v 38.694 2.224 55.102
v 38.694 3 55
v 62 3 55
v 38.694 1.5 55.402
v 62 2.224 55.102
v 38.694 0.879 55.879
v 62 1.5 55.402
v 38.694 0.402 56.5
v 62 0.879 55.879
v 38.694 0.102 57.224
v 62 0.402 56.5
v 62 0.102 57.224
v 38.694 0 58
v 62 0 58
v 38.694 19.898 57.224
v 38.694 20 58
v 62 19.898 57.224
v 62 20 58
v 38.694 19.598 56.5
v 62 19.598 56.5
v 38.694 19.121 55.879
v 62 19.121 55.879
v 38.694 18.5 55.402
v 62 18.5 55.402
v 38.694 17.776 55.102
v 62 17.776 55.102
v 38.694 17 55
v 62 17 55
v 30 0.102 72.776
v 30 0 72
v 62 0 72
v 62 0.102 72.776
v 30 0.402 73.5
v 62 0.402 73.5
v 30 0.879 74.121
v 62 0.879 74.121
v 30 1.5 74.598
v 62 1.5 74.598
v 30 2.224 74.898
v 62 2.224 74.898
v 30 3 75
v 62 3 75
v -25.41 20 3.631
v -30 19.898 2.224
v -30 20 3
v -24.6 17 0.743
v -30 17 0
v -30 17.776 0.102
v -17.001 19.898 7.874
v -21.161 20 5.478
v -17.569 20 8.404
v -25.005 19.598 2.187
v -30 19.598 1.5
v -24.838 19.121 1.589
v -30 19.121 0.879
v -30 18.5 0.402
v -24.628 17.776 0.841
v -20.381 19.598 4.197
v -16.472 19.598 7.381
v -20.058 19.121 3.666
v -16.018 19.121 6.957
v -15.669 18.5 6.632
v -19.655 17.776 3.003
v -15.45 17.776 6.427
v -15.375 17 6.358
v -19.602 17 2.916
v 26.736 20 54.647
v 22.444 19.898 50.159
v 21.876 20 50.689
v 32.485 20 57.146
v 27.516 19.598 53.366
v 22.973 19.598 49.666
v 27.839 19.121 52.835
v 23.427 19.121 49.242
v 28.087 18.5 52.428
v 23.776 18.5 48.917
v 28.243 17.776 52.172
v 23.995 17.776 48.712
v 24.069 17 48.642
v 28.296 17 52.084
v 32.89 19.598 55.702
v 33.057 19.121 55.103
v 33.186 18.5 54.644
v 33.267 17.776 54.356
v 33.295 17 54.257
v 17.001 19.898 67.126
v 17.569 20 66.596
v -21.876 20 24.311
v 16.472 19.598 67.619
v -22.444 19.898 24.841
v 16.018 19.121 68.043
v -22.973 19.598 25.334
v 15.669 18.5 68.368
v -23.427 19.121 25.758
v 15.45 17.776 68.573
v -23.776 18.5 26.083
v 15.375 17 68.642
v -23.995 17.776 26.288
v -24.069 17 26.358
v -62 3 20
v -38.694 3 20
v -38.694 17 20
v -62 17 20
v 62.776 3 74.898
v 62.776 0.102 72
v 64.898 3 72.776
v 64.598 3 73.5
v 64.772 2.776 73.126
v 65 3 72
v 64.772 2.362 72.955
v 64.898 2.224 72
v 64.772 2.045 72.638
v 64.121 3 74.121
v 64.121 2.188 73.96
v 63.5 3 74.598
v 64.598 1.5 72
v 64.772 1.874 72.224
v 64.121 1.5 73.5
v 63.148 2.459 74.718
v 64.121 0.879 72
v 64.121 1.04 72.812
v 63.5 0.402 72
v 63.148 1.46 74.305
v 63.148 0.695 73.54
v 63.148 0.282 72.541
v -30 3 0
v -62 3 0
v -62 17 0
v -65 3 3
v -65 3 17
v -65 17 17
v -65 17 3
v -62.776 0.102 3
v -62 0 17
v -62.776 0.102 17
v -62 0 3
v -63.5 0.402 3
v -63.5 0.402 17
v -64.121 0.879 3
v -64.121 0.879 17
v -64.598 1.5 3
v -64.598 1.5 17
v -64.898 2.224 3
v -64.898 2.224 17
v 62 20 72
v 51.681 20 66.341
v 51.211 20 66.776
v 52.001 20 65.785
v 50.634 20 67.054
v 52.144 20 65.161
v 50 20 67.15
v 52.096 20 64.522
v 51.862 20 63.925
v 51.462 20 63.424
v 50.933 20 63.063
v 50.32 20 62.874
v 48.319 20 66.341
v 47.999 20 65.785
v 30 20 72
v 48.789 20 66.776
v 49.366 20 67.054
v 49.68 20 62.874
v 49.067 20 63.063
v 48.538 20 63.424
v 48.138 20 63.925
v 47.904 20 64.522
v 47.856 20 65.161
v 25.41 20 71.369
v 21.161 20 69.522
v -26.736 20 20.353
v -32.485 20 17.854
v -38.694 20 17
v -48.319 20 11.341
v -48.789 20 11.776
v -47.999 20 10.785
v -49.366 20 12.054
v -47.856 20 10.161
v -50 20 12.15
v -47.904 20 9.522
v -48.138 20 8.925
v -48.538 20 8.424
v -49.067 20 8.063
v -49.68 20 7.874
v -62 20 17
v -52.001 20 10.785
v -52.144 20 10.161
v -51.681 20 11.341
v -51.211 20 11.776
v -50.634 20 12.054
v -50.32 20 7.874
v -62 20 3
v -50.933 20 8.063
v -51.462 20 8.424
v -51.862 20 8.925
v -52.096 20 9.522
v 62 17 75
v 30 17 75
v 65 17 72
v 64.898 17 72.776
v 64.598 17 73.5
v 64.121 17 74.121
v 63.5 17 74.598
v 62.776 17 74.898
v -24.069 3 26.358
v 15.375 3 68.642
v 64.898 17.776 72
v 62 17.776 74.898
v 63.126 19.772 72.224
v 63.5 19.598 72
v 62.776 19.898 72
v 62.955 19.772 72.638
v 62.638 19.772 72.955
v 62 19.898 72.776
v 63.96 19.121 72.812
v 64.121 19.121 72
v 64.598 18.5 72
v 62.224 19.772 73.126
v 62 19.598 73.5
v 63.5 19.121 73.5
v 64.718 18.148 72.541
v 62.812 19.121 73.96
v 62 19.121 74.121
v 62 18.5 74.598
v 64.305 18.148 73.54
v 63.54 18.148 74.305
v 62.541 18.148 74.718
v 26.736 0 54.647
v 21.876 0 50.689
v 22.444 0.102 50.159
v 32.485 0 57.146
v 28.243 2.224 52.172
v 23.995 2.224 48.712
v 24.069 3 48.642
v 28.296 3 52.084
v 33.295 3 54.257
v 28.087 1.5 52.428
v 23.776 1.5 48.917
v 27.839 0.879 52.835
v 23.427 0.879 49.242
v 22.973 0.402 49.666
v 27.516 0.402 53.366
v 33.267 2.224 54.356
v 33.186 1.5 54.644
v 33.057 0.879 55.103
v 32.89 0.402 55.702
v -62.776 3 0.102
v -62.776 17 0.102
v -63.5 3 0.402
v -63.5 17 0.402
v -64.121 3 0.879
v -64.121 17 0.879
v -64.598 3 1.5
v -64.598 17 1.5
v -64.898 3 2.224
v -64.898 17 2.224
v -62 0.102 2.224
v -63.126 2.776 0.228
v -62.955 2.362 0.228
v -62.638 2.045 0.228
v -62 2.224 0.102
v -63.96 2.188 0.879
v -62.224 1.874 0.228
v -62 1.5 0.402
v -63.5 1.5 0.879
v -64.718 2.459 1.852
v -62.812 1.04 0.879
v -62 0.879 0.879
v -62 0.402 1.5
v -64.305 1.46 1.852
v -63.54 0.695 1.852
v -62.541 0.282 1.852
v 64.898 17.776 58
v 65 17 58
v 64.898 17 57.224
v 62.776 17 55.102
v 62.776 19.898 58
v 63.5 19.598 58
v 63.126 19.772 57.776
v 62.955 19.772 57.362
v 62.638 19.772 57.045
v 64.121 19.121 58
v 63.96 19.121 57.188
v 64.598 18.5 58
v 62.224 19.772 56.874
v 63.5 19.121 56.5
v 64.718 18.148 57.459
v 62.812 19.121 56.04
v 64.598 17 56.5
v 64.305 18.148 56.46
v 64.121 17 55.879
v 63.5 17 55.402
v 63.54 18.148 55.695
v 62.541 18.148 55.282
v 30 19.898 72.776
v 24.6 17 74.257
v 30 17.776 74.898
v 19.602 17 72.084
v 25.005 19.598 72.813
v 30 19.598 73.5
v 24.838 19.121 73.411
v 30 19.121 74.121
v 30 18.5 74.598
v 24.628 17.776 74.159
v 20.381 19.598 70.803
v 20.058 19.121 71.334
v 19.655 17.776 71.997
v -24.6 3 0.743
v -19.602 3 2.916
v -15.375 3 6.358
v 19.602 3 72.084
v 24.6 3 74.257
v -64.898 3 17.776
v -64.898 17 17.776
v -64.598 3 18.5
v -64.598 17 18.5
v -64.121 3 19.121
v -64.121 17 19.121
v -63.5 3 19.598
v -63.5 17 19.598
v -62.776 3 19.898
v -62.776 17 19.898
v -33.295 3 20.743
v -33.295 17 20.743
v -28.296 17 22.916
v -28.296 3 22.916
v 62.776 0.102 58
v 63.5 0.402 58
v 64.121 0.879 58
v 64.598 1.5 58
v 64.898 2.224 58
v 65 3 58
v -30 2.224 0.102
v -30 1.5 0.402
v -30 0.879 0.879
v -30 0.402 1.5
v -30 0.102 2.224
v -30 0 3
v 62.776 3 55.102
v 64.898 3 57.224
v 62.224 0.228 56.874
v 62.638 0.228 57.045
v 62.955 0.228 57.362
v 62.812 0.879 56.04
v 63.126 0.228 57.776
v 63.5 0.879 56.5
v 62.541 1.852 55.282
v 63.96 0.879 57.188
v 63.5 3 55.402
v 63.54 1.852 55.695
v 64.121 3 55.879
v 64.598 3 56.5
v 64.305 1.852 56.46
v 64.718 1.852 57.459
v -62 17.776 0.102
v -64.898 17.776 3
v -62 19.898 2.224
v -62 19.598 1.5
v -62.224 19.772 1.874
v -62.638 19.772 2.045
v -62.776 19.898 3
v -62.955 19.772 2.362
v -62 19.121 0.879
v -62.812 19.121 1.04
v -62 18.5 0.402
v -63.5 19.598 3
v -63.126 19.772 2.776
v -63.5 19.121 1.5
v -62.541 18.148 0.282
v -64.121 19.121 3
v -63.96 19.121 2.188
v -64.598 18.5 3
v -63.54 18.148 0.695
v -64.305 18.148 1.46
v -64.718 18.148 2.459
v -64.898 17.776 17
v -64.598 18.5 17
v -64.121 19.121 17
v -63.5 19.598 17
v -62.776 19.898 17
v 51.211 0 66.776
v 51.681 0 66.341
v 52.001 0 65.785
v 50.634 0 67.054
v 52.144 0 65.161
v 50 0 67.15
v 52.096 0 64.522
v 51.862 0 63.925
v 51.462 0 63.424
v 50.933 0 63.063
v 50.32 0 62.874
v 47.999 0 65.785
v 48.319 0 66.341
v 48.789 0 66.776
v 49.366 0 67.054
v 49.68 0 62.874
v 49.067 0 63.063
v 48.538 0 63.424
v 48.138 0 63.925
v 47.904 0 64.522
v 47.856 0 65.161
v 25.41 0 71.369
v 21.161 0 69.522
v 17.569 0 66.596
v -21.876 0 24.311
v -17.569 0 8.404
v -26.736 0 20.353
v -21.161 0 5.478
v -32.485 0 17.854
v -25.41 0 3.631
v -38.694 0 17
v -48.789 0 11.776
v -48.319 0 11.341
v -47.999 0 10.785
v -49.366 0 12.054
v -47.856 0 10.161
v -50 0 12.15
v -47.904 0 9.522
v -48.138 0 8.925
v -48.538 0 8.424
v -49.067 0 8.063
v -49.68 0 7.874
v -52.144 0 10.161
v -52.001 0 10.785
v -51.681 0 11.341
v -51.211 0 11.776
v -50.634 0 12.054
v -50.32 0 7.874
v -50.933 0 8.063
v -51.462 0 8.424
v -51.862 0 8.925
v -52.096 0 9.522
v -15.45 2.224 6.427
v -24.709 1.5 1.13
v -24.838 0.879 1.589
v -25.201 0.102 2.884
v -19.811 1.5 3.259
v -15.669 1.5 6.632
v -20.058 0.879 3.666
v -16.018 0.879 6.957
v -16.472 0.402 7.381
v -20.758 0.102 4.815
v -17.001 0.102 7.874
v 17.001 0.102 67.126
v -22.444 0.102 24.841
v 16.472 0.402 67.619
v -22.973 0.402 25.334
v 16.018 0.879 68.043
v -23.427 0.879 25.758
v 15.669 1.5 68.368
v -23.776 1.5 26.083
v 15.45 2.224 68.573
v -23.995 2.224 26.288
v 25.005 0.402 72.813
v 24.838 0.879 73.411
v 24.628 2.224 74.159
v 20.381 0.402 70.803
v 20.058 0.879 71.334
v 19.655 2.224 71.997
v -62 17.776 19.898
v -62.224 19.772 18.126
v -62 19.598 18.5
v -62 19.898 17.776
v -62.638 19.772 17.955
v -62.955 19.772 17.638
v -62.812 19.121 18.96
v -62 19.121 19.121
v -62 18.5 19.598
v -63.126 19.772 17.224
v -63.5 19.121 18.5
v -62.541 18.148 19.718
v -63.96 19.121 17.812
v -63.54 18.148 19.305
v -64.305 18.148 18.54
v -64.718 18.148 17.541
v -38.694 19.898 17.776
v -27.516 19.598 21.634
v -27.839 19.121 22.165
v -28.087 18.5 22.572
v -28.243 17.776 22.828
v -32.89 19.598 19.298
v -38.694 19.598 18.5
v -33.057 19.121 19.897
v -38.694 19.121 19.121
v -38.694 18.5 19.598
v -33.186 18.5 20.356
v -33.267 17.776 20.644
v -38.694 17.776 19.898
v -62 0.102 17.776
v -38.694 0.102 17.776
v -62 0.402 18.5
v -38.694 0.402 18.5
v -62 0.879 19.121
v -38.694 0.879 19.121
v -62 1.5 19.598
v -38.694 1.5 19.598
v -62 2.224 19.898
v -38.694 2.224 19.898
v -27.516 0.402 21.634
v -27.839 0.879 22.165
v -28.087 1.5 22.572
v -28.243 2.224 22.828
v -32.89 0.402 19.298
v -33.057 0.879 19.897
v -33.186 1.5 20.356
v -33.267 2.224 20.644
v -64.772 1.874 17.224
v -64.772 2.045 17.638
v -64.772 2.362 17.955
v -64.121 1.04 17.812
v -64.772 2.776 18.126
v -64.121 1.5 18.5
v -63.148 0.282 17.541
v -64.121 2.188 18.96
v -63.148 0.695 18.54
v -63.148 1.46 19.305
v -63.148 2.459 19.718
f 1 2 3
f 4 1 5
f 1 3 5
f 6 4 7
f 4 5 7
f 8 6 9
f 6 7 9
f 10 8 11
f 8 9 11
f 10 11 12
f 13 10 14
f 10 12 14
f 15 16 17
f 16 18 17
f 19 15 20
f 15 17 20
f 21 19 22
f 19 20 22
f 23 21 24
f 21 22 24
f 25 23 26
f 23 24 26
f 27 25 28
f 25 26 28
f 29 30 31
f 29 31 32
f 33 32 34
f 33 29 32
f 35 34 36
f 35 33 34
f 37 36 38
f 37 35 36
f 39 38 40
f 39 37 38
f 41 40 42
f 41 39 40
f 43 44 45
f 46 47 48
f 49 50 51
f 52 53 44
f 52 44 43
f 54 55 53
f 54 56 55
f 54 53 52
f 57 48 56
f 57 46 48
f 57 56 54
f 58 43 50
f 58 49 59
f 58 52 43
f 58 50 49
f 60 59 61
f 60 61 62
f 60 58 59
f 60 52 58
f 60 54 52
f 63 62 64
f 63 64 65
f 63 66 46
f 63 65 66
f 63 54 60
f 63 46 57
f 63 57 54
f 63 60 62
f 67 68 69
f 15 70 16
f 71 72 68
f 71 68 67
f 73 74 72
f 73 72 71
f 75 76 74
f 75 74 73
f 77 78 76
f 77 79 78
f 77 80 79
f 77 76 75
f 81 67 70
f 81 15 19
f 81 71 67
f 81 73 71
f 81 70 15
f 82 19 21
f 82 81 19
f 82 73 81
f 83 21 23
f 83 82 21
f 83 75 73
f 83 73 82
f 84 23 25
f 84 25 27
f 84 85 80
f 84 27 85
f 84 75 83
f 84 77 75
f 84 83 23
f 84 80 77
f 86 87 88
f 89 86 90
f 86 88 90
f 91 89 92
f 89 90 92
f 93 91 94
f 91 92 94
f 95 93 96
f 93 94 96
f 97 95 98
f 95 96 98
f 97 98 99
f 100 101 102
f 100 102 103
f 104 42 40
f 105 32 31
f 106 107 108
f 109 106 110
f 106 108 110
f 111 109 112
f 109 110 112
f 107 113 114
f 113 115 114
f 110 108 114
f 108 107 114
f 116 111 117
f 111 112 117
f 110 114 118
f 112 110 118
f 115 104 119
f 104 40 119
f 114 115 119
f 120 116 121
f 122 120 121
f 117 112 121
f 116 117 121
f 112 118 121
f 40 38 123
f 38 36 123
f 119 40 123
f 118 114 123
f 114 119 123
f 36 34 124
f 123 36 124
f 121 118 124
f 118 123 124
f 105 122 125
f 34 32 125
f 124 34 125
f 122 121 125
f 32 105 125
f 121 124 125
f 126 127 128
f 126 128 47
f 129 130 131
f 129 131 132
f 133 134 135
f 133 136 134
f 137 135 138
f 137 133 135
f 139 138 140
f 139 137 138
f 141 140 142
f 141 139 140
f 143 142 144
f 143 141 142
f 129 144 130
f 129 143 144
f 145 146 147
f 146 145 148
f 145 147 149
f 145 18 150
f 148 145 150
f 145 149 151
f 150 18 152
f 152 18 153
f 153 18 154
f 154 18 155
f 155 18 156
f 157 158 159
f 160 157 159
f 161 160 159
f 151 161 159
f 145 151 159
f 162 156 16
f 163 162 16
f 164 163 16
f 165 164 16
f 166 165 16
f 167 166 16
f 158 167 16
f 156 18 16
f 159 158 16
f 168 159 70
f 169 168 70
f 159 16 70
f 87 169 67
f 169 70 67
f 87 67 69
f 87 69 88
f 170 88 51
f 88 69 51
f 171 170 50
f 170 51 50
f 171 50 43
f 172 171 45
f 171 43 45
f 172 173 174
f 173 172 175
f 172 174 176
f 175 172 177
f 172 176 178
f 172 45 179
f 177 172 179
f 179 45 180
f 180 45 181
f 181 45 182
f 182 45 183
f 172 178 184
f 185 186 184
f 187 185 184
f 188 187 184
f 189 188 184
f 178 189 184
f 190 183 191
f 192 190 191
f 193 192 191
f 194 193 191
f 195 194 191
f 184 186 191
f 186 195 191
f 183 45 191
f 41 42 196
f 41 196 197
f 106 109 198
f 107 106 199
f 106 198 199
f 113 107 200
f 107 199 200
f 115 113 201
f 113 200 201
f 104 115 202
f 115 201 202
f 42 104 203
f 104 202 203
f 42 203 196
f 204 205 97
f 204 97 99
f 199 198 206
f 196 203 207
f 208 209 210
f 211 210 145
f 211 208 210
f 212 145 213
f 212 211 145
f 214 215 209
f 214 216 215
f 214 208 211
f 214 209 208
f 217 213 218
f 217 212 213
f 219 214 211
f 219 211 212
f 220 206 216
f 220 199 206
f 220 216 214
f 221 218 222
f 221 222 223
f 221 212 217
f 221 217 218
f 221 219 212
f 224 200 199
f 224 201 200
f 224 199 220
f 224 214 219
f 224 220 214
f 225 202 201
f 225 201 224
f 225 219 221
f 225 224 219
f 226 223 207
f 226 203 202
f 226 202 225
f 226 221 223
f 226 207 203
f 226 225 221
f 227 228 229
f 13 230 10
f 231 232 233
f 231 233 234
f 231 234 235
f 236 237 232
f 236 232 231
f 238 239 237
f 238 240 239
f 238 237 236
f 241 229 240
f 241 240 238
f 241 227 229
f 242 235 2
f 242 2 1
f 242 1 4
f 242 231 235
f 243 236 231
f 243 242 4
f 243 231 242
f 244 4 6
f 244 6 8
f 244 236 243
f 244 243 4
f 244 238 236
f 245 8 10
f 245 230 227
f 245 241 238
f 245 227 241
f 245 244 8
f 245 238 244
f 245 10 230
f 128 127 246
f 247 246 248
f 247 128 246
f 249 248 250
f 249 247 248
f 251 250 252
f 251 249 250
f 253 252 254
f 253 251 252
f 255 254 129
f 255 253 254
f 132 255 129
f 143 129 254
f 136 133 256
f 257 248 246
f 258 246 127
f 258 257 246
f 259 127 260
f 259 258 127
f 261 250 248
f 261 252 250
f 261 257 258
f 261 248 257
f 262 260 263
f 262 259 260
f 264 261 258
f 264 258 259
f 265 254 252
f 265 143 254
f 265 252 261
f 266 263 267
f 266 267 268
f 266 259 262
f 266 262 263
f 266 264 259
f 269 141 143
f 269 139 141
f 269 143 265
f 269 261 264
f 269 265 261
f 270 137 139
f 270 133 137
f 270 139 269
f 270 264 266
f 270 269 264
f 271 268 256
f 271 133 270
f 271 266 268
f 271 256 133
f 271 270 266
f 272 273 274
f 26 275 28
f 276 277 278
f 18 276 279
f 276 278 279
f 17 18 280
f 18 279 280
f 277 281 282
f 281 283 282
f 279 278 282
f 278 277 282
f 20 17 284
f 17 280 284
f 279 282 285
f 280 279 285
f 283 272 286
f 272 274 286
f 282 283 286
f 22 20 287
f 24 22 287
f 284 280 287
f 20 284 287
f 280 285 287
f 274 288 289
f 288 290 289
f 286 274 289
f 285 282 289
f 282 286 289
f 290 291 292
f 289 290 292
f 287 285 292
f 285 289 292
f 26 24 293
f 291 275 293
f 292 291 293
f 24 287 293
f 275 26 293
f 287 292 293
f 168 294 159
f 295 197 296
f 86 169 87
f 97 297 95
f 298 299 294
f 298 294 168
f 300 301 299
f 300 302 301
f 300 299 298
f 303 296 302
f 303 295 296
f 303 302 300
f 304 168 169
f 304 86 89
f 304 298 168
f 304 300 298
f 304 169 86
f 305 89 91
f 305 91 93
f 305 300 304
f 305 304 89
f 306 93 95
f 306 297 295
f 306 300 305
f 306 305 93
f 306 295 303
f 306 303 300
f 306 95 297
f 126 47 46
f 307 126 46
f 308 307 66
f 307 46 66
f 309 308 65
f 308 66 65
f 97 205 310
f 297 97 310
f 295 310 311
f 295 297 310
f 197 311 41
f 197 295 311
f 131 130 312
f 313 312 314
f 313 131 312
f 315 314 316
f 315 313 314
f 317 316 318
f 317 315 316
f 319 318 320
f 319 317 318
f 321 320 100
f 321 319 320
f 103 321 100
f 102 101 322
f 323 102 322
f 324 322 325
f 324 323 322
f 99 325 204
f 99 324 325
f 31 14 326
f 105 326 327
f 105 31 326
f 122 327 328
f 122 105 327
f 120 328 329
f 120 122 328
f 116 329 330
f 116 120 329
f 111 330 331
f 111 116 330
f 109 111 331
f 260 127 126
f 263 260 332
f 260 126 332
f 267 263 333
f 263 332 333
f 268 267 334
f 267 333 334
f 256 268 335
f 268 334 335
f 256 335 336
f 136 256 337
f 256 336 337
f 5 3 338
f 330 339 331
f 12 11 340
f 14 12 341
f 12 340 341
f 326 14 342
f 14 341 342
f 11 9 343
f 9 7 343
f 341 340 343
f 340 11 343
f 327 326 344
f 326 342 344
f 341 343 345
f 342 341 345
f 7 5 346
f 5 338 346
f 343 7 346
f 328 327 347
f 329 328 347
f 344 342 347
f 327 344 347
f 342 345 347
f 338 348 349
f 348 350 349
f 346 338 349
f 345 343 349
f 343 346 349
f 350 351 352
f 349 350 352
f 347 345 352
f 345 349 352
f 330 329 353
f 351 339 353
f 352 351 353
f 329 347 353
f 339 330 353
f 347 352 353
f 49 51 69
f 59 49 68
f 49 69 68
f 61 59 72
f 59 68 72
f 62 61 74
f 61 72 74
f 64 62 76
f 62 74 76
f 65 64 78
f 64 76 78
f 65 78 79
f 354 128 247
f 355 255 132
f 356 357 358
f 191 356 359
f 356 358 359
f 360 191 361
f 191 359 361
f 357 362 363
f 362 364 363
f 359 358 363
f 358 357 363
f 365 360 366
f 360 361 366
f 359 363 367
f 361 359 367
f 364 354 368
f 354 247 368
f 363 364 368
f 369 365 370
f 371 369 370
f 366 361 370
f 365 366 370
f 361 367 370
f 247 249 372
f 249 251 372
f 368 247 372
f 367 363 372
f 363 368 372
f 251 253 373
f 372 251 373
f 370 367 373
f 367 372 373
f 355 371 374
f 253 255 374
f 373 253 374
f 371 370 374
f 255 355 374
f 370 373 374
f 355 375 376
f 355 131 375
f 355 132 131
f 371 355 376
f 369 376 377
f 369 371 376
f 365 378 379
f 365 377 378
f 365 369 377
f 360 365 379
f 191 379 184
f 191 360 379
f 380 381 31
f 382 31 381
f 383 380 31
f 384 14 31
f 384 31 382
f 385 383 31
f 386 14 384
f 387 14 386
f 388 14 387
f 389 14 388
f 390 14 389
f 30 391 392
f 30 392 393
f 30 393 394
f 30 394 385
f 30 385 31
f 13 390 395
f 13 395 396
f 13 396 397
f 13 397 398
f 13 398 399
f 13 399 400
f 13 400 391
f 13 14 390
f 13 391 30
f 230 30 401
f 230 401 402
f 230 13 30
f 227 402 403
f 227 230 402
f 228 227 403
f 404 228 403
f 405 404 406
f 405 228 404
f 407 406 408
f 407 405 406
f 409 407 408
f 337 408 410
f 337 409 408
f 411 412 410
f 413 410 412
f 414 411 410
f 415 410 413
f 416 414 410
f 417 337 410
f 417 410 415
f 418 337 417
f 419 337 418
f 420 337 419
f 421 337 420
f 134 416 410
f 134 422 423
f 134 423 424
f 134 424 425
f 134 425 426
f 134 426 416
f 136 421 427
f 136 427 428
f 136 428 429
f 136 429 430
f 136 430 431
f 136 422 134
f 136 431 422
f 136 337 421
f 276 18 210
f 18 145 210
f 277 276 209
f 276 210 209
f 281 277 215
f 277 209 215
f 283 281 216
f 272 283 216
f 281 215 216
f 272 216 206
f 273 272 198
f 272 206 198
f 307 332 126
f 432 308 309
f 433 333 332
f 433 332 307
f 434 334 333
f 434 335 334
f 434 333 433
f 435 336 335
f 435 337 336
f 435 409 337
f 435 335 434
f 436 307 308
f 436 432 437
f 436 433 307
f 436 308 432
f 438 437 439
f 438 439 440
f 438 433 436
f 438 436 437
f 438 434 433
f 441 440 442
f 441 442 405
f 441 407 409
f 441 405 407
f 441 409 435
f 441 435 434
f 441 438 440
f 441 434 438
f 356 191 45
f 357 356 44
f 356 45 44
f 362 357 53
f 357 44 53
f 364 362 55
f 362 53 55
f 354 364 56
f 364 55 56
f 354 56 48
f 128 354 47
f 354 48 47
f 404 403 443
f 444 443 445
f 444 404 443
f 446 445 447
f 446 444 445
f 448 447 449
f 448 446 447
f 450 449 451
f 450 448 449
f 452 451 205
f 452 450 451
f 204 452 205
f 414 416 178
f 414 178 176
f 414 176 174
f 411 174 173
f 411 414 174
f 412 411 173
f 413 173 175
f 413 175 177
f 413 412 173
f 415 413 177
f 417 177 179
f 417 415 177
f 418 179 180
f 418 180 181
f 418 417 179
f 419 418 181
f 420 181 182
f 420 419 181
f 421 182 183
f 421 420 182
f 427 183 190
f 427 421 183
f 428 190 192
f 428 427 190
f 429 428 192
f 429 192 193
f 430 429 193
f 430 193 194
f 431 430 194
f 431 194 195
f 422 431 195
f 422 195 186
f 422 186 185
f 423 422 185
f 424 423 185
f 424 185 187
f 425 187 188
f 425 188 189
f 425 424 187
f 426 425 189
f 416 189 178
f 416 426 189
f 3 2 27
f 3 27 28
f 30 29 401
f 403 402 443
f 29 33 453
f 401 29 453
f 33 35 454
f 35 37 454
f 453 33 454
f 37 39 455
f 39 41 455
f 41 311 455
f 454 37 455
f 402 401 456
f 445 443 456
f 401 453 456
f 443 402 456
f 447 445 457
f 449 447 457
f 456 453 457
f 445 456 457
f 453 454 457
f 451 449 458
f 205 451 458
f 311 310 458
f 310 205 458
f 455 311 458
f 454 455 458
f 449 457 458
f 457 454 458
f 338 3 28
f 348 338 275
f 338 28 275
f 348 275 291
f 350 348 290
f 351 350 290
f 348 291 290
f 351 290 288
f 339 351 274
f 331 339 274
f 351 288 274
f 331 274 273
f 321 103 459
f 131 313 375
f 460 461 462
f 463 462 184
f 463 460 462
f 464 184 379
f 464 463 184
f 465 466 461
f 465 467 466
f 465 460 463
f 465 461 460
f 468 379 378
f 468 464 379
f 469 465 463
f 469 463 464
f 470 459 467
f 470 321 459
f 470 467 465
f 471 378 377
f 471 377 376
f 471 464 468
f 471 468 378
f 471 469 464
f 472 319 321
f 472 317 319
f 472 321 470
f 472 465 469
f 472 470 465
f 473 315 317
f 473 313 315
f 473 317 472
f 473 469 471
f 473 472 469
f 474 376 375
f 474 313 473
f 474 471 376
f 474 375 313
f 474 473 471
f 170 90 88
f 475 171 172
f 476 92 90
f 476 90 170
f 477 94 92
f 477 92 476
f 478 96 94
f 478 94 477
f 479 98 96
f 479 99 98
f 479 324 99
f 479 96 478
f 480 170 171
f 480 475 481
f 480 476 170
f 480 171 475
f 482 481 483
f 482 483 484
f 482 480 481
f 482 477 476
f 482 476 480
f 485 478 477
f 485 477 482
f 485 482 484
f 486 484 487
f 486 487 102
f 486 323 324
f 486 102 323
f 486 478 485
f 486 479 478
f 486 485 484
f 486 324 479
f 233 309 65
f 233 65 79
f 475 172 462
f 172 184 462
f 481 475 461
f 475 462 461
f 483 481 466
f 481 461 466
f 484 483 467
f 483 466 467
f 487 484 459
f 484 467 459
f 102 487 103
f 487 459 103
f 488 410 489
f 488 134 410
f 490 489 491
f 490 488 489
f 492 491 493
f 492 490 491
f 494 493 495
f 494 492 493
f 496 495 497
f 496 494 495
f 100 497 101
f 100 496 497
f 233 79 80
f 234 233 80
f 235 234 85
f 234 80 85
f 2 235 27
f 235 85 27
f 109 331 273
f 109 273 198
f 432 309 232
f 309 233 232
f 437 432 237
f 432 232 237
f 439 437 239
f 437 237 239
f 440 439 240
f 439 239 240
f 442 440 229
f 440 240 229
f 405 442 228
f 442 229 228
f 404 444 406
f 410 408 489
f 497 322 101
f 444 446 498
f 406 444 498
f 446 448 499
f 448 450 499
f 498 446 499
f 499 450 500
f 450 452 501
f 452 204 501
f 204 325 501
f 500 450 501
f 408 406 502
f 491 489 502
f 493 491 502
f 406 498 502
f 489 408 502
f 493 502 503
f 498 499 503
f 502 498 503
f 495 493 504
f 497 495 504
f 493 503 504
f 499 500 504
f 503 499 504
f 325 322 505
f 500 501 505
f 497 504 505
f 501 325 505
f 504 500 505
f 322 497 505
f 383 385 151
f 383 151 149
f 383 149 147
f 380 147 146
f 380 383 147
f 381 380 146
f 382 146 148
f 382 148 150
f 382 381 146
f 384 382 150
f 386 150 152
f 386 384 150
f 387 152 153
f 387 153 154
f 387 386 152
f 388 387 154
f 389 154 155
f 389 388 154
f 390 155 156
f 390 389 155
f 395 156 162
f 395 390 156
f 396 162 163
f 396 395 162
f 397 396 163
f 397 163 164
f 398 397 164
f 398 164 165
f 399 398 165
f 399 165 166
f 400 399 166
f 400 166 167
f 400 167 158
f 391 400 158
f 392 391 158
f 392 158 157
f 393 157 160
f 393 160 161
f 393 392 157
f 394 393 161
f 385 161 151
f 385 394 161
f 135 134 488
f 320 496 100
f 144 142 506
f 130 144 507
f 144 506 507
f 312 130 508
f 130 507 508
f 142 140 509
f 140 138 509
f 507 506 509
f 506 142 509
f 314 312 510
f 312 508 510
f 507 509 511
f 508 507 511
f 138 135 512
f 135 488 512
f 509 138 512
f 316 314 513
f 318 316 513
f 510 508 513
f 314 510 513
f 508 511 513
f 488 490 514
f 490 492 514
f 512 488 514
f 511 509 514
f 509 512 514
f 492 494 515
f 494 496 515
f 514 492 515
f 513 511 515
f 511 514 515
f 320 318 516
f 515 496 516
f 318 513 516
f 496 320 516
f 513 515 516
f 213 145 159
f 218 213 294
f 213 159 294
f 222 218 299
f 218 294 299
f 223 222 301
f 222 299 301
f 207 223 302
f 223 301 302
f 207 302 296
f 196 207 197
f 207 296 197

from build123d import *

# Parameters (mm, degrees)
CROQUIS1_R              = 2.15
SALIENTE_EXTRUIR1_DEPTH = 20
REDONDEO1_R             = 20
REDONDEO2_R             = 3


with BuildPart() as part:
    # Croquis1 → Saliente-Extruir1 (new body)
    with BuildSketch(Plane(origin=(0, 0, 0), x_dir=(1, 0, 0), z_dir=(0, 1, 0))):
        Polygon((-65, 0), (-21.305768696, 0), (30, -55), (65, -55), (65, -75), (21.305768696, -75), (-30, -20), (-65, -20), align=None)
        with Locations(Location((-50, -10, 0), (0, 0, 270))):
            Circle(CROQUIS1_R, mode=Mode.SUBTRACT)
        with Locations(Location((50, -65, 0), (0, 0, 270))):
            Circle(CROQUIS1_R, mode=Mode.SUBTRACT)
    extrude(amount=SALIENTE_EXTRUIR1_DEPTH)

    # Redondeo1
    redondeo1_edges = [part.edges().sort_by_distance(p)[0] for p in [
        (-21.305768696, 10, 0),
        (30, 10, 55),
        (21.305768696, 10, 75),
        (-30, 10, 20),
    ]]
    fillet(redondeo1_edges, radius=REDONDEO1_R)

    # Redondeo2
    redondeo2_edges = [part.edges().sort_by_distance(p)[0] for p in [
        (-51.847115652, 0, 20),
        (-65, 0, 10),
        (-65, 10, 0),
        (65, 10, 55),
        (65, 10, 75),
        (-65, 10, 20),
        (65, 20, 65),
        (51.847115652, 20, 55),
        (47.5, 0, 75),
        (47.5, 20, 75),
        (-47.5, 0, 0),
        (4.347115652, 0, 27.5),
        (-4.347115652, 0, 47.5),
        (-22.026573691, 0, 1.658122427),
        (22.026573691, 0, 73.341877573),
        (-4.347115652, 20, 47.5),
        (4.347115652, 20, 27.5),
        (-47.5, 20, 0),
        (-22.026573691, 20, 1.658122427),
        (22.026573691, 20, 73.341877573),
        (30.720804996, 0, 53.341877573),
        (30.720804996, 20, 53.341877573),
        (-30.720804996, 0, 21.658122427),
        (-30.720804996, 20, 21.658122427),
        (-65, 20, 10),
        (-51.847115652, 20, 20),
        (51.847115652, 0, 55),
        (65, 0, 65),
    ]]
    fillet(redondeo2_edges, radius=REDONDEO2_R)


solid = part.part
